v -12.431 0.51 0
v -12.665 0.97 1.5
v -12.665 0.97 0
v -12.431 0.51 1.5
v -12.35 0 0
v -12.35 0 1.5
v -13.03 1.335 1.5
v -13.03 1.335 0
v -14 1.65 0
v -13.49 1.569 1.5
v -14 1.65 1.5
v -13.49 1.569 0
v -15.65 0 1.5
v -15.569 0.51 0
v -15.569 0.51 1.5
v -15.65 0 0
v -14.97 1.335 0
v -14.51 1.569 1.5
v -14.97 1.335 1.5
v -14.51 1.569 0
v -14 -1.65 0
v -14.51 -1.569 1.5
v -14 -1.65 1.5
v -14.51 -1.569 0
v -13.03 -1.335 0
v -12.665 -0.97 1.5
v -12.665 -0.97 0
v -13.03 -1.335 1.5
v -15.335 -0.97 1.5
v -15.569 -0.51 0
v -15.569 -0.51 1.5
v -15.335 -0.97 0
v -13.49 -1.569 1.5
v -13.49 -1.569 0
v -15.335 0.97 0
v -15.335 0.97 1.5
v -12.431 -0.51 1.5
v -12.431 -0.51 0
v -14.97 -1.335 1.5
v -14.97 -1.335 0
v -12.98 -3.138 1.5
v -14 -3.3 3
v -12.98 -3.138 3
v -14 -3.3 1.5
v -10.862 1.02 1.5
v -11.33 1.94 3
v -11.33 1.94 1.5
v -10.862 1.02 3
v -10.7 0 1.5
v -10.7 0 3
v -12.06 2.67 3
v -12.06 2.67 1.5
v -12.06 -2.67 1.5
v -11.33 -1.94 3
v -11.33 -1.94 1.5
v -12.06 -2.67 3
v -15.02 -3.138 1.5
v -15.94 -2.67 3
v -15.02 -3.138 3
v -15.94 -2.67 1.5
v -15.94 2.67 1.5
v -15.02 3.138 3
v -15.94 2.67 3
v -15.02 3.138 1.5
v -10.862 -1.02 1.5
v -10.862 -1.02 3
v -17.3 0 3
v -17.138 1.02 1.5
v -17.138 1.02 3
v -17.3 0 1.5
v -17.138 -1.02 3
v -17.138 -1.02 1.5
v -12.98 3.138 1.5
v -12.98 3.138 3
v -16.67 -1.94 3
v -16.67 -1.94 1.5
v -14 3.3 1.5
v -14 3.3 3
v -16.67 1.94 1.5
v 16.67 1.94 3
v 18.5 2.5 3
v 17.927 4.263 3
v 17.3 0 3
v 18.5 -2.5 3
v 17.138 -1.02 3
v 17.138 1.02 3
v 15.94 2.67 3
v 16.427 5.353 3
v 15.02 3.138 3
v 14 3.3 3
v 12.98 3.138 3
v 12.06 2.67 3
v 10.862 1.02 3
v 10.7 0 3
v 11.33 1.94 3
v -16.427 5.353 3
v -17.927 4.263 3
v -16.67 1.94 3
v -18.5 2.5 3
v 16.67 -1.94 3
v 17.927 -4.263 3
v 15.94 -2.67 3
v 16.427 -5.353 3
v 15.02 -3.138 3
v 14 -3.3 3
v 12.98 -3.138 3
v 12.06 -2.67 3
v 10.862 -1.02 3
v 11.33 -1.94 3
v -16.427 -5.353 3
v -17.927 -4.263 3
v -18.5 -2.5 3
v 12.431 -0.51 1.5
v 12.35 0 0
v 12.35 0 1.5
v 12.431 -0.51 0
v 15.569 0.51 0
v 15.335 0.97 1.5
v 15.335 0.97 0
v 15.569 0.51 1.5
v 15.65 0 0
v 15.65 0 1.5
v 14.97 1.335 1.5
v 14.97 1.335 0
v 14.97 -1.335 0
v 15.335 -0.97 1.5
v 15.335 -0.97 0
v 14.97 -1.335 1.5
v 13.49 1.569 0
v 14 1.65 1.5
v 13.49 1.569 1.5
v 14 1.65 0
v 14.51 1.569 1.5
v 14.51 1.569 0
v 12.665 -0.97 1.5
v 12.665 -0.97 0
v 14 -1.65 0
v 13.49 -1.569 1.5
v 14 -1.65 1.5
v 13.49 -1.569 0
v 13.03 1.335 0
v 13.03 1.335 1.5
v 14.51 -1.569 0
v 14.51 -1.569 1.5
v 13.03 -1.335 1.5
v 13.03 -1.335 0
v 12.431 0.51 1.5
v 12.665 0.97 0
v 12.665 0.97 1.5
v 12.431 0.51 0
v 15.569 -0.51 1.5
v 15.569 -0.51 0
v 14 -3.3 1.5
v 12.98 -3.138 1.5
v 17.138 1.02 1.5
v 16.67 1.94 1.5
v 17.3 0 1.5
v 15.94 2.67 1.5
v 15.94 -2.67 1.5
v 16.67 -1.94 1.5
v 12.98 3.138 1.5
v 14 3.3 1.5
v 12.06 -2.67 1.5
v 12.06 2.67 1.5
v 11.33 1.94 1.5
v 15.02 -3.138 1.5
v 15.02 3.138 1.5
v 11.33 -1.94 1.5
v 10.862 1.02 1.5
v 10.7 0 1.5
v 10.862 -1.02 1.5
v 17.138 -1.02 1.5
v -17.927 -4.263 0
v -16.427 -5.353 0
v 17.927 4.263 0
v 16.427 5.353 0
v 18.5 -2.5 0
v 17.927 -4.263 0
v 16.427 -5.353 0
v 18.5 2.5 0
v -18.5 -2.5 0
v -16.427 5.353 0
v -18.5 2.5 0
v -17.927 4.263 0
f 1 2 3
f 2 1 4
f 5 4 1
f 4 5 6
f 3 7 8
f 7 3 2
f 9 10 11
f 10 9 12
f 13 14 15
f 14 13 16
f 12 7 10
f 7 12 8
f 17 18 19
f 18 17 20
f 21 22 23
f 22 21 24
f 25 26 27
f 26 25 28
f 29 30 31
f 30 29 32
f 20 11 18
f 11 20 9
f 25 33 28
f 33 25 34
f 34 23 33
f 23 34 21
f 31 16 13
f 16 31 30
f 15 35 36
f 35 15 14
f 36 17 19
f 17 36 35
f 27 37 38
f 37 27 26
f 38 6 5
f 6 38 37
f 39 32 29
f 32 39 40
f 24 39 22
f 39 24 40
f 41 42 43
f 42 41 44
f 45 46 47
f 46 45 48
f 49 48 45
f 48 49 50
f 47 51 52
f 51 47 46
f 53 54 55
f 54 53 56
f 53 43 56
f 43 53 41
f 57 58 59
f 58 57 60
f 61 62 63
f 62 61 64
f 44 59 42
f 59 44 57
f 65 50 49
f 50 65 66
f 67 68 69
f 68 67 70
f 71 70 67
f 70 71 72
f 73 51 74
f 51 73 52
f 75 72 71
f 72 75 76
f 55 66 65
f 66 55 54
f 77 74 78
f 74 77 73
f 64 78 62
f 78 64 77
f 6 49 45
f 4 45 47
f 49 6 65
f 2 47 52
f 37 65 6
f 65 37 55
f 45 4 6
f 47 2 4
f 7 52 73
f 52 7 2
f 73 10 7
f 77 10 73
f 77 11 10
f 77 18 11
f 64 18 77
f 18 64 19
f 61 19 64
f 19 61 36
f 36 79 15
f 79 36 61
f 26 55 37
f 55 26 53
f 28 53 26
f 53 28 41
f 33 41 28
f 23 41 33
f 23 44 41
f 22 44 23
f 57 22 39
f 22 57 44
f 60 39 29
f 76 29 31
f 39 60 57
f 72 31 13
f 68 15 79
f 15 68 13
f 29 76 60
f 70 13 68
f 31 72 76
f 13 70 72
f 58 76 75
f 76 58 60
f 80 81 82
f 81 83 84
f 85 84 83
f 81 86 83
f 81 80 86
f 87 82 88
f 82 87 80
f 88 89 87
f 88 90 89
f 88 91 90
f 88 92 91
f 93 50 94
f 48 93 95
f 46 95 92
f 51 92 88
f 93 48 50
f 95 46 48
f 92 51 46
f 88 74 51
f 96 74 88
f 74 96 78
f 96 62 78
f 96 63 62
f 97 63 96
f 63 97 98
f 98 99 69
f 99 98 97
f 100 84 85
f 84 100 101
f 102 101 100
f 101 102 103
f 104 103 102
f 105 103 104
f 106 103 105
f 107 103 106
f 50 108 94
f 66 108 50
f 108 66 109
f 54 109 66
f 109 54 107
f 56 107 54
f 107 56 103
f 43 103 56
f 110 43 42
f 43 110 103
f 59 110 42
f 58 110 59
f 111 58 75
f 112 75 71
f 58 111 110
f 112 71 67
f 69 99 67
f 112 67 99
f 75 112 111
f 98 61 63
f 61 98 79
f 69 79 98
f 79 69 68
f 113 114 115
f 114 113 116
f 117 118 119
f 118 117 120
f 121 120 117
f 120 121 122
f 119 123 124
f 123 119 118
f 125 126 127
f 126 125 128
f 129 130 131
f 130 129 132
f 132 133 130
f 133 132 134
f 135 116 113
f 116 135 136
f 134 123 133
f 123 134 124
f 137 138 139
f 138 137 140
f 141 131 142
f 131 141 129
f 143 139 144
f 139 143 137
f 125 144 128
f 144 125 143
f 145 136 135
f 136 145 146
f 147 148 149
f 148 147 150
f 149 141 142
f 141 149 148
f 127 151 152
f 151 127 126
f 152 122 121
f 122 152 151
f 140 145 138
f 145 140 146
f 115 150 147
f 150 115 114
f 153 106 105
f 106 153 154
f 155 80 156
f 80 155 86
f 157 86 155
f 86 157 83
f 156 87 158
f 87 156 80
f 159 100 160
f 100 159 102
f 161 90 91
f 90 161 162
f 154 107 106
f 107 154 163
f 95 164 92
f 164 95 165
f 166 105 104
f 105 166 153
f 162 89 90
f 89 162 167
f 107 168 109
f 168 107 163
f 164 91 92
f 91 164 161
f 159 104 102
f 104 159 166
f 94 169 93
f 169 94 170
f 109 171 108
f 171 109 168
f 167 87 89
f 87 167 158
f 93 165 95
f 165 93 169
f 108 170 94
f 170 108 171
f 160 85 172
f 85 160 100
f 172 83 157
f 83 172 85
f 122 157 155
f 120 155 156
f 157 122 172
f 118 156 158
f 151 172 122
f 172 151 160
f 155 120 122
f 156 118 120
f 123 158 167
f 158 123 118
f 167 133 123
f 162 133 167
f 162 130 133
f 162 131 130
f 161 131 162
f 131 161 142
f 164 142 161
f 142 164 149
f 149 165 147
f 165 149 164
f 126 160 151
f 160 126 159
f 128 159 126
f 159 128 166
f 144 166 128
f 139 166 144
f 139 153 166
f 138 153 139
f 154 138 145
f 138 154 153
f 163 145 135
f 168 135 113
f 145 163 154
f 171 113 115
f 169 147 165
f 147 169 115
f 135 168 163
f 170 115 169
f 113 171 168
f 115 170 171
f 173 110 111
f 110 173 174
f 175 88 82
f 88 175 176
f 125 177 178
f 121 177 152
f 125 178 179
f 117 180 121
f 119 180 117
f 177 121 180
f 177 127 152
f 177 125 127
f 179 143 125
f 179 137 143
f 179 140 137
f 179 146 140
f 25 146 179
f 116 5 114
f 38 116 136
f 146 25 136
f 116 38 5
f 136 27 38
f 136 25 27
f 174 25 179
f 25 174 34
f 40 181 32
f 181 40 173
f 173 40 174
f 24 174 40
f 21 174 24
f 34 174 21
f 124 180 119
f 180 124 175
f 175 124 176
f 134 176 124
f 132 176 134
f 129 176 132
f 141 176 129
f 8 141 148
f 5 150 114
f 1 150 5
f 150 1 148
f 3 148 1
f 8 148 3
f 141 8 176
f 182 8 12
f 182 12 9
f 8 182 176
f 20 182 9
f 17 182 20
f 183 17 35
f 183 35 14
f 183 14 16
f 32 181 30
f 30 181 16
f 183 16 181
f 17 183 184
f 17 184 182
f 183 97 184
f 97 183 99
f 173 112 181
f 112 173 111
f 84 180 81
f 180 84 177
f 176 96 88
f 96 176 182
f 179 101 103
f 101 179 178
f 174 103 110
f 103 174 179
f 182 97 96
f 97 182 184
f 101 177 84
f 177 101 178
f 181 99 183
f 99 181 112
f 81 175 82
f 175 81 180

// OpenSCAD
// file: dronePlates.scad
/**
 * dronePlates.scad
 * Plate library
 *
 * GNU GPL V3
 * @author: Victor Potenciano
 */

m3Rad = 3.4/2;
cornerR = 4;

/**
 *
 */
module helperDisk(diameter) {
	cylinder(r = diameter/2, h = 0.6, $fn=20);
}

/**
 *
 */
module roundedRect(size, radius) {
	x = size[0];
	y = size[1];
	z = size[2];

	linear_extrude(height=z)
	hull() {
	// place 4 circles in the corners, with the given radius
	translate([(-x/2)+(radius/2), (-y/2)+(radius/2), 0]){ circle(r=radius); }
	translate([(x/2)-(radius/2), (-y/2)+(radius/2), 0]){ circle(r=radius); }
	translate([(-x/2)+(radius/2), (y/2)-(radius/2), 0]){ circle(r=radius); }
	translate([(x/2)-(radius/2), (y/2)-(radius/2), 0]){ circle(r=radius); }
	}
}

/**
 * rounded rectangle triangle with corner at origin
 */
module roundedTriangle(size, radius) {
	x = size[0];
	y = size[1];
	z = size[2];

	linear_extrude(height=z)
	hull() {
	translate([radius, radius, 0]){ circle(r=radius); }
	translate([x-radius, radius, 0]){ circle(r=radius); }
	translate([radius, y-radius, 0]){ circle(r=radius); }
	}
}

/**
 *
 */
module roundRectPlate(w, l, plateThick=3) {
	difference(){
		roundedRect([l+m3Rad*1.75,w+m3Rad*1.75,plateThick], cornerR);
		translate([l/2, w/2, -0.5]) { cylinder(h = plateThick+1, r = m3Rad, $fn=30); }
		translate([-l/2, w/2, -0.5]) { cylinder(h = plateThick+1, r = m3Rad, $fn=30); }
		translate([l/2, -w/2, -0.5]) { cylinder(h = plateThick+1, r = m3Rad, $fn=30); }
		translate([-l/2, -w/2, -0.5]) { cylinder(h = plateThick+1, r = m3Rad, $fn=30); }
	}
}

/**
 *
 */
module crossSquarePlate(l, thick=3) {
	inDist = cornerR*2+4;
	trianL = sqrt((l*l)/2)-inDist;
	centerR = 4;

	difference(){
		roundRectPlate(l, l, thick);
		translate([0, centerR, -0.5]) { 
			rotate([0,0,45]){ roundedTriangle([trianL,trianL,thick+1], cornerR-2); }
		}
		translate([0, -centerR, -0.5]) { 
			rotate([0,0,225]){ roundedTriangle([trianL,trianL,thick+1], cornerR-2); }
		}
		translate([-centerR, 0, -0.5]) { 
			rotate([0,0,135]){ roundedTriangle([trianL,trianL,thick+1], cornerR-2); }
		}
		translate([centerR, 0, -0.5]) { 
			rotate([0,0,-45]){ roundedTriangle([trianL,trianL,thick+1], cornerR-2); }
		}
	}
}

/**
 *
 */
module hShapePlate(w, l, thick=4) {
	inDist = cornerR*2+1;

	difference(){
		roundRectPlate(w, l, thick);
		translate([0, w/4, -0.5]) { roundedRect([l-inDist,w/2-inDist,thick+1], cornerR-2); }
		translate([0, -w/4, -0.5]) { roundedRect([l-inDist,w/2-inDist,thick+1], cornerR-2); }
	}
}

/**
 *
 */
module motorCircleMount(inDia, outDia, thick=3, extraH=false, d1=19, d2=16, holeR=m3Rad ) {
	difference(){
		cylinder(h = thick, r = outDia/2, $fn=30);
		motorCircleMountHoles(inDia, outDia, thick, extraH, d1=d1, d2=d2, holeR=holeR);
	}
}

/**
 *
 */
module motorCircleMountHoles(inDia, outDia, thick=3, extraH=false, d1=19, d2=16, d3=25, holeR=m3Rad) {
	translate([0, 0, -0.5]) { cylinder(h = thick+1, r = inDia/2, $fn=30); }

	for(i=[0:3]) {
		rotate([0,0,90*i]){
		translate([d1/2, 0, -0.5]) cylinder(h = thick+1, r = holeR, $fn=20);
		translate([d2/2, 0, -0.5]) cylinder(h = thick+1, r = holeR, $fn=20);
		translate([d2/2, -holeR, -0.5]) cube(size = [(d1-d2)/2,holeR*2,thick+1]);
		}
	}
	
	if(extraH==true){	
		for(i=[-1,1]) translate([i*d3/2, 0, -0.5]) { cylinder(h = thick+1, r = holeR, $fn=30); }
	}
}

/**
 *
 */
module motorRectMount(w, l, inDia, thick=3) {
	d1=19;
	d2=16;

	difference(){
		roundRectPlate(w, l, thick);
		translate([0, 0, -0.5]) { cylinder(h = thick+1, r = inDia/2, $fn=30); }
		translate([0, d1/2, -0.5]) { cylinder(h = thick+1, r = m3Rad, $fn=30); }
		translate([0, -d1/2, -0.5]) { cylinder(h = thick+1, r = m3Rad, $fn=30); }
		translate([d2/2, 0, -0.5]) { cylinder(h = thick+1, r = m3Rad, $fn=30); }
		translate([-d2/2, 0, -0.5]) { cylinder(h = thick+1, r = m3Rad, $fn=30); }
	}
}

/**
 *
 */
module tube(inDia, outDia, height) {
	difference(){
		cylinder(h = height, r = outDia/2, $fn=50);
		translate([0, 0, -0.5]) { cylinder(h = height+1, r = inDia/2, $fn=30); }
	}
}

/**
 *
 */
module squareTube(inDia, outDia, height) {
	translate([0,0,height/2]){
	difference(){
		cube(size = [outDia,outDia,height], center = true);
		cube(size = [inDia,inDia,height+1], center = true);
	}
	}
}

/**
 *
 */
module djiFlamewheelHoles(height) {
	a = 23;
	b = 16;
	c = 19.5;
	
	translate([a/2, c/2, 0]) { cylinder(h = height, r = m3Rad, $fn=30); }
	translate([-a/2, c/2, 0]) { cylinder(h = height, r = m3Rad, $fn=30); }
	translate([b/2, -c/2, 0]) { cylinder(h = height, r = m3Rad, $fn=30); }
	translate([-b/2, -c/2, 0]) { cylinder(h = height, r = m3Rad, $fn=30); }
}

/**
 *
 */
module djiFlamewheelHolesBotton(height) {
	a1 = 21;
	c = 19.5;
	
	translate([a1/2, c/2, 0]) { cylinder(h = height, r = m3Rad, $fn=30); }
	translate([-a1/2, c/2, 0]) { cylinder(h = height, r = m3Rad, $fn=30); }
}

/**
 *
 */
module propeller(size){
union(){
difference(){
	cylinder(h = 3, r = size/2, center=true, $fn=30);
	cylinder(h = 3.1, r = size/2-2, center=true, $fn=30); 
}
for( i = [-1,1] ){
rotate([0,0,45*i]){ cube(size = [size,4,1], center = true); }
}
}
}

/**
 *
 */
module slot(length, height, rad){
for(i=[-1,1]) translate([i*length/2,0,0]) cylinder(h = height, r = rad, $fn=30);
translate([0,0,height/2]) cube(size = [length,rad*2,height], center = true);
}

 

////////////////////////
// Examples:
////////////////////////

motorCircleMount(8, 25, 3.5);

//roundedRect([50,50,3], 4);

//hShapePlate(79, 25);

//rotate([0,0,45]){roundedTriangle([40,40,3], 4);}

//crossSquarePlate(45, 4);

/*
union(){
motorRectMount(21, 18, 8, 4);
translate([9, 10.5, 0]) {tube(m3Rad*2, 6.5, 6);}
}
*/

/*
difference(){
union(){
hShapePlate(50, 30, 3.5);
translate([-4,-25,0]){cube(size = [8,50,3.5]);}
rotate([0, 0, 45]) {motorCircleMount(8, 35, 3.5);}
}
cylinder(h = 10, r = 4, $fn=100, center=true);
}
*/

//rotate([90,0,0]){ tube(5,10,20); }
//translate([20,0,0]){ squareTube(5, 10, 20); }
// main file
/**
 * lt210 bumper
 */

use <dronePlates.scad>;

holeDist = 28;
m3Rad = 3.3/2;
thick = 3;
width = 37;
length = 11;
holeShift = 0;


//translate([0,20,0]) cube(size=[width,2,2], center=true);

difference(){
roundedRect([width-3,length-3,thick], 3);

for(i=[-1,1]){
translate([i*holeDist/2, holeShift, -0.5]) cylinder(r=m3Rad, h=thick+1, $fn=20);
translate([i*holeDist/2, holeShift, thick/2]) cylinder(r=m3Rad*2, h=thick/2, $fn=20);
}

}
